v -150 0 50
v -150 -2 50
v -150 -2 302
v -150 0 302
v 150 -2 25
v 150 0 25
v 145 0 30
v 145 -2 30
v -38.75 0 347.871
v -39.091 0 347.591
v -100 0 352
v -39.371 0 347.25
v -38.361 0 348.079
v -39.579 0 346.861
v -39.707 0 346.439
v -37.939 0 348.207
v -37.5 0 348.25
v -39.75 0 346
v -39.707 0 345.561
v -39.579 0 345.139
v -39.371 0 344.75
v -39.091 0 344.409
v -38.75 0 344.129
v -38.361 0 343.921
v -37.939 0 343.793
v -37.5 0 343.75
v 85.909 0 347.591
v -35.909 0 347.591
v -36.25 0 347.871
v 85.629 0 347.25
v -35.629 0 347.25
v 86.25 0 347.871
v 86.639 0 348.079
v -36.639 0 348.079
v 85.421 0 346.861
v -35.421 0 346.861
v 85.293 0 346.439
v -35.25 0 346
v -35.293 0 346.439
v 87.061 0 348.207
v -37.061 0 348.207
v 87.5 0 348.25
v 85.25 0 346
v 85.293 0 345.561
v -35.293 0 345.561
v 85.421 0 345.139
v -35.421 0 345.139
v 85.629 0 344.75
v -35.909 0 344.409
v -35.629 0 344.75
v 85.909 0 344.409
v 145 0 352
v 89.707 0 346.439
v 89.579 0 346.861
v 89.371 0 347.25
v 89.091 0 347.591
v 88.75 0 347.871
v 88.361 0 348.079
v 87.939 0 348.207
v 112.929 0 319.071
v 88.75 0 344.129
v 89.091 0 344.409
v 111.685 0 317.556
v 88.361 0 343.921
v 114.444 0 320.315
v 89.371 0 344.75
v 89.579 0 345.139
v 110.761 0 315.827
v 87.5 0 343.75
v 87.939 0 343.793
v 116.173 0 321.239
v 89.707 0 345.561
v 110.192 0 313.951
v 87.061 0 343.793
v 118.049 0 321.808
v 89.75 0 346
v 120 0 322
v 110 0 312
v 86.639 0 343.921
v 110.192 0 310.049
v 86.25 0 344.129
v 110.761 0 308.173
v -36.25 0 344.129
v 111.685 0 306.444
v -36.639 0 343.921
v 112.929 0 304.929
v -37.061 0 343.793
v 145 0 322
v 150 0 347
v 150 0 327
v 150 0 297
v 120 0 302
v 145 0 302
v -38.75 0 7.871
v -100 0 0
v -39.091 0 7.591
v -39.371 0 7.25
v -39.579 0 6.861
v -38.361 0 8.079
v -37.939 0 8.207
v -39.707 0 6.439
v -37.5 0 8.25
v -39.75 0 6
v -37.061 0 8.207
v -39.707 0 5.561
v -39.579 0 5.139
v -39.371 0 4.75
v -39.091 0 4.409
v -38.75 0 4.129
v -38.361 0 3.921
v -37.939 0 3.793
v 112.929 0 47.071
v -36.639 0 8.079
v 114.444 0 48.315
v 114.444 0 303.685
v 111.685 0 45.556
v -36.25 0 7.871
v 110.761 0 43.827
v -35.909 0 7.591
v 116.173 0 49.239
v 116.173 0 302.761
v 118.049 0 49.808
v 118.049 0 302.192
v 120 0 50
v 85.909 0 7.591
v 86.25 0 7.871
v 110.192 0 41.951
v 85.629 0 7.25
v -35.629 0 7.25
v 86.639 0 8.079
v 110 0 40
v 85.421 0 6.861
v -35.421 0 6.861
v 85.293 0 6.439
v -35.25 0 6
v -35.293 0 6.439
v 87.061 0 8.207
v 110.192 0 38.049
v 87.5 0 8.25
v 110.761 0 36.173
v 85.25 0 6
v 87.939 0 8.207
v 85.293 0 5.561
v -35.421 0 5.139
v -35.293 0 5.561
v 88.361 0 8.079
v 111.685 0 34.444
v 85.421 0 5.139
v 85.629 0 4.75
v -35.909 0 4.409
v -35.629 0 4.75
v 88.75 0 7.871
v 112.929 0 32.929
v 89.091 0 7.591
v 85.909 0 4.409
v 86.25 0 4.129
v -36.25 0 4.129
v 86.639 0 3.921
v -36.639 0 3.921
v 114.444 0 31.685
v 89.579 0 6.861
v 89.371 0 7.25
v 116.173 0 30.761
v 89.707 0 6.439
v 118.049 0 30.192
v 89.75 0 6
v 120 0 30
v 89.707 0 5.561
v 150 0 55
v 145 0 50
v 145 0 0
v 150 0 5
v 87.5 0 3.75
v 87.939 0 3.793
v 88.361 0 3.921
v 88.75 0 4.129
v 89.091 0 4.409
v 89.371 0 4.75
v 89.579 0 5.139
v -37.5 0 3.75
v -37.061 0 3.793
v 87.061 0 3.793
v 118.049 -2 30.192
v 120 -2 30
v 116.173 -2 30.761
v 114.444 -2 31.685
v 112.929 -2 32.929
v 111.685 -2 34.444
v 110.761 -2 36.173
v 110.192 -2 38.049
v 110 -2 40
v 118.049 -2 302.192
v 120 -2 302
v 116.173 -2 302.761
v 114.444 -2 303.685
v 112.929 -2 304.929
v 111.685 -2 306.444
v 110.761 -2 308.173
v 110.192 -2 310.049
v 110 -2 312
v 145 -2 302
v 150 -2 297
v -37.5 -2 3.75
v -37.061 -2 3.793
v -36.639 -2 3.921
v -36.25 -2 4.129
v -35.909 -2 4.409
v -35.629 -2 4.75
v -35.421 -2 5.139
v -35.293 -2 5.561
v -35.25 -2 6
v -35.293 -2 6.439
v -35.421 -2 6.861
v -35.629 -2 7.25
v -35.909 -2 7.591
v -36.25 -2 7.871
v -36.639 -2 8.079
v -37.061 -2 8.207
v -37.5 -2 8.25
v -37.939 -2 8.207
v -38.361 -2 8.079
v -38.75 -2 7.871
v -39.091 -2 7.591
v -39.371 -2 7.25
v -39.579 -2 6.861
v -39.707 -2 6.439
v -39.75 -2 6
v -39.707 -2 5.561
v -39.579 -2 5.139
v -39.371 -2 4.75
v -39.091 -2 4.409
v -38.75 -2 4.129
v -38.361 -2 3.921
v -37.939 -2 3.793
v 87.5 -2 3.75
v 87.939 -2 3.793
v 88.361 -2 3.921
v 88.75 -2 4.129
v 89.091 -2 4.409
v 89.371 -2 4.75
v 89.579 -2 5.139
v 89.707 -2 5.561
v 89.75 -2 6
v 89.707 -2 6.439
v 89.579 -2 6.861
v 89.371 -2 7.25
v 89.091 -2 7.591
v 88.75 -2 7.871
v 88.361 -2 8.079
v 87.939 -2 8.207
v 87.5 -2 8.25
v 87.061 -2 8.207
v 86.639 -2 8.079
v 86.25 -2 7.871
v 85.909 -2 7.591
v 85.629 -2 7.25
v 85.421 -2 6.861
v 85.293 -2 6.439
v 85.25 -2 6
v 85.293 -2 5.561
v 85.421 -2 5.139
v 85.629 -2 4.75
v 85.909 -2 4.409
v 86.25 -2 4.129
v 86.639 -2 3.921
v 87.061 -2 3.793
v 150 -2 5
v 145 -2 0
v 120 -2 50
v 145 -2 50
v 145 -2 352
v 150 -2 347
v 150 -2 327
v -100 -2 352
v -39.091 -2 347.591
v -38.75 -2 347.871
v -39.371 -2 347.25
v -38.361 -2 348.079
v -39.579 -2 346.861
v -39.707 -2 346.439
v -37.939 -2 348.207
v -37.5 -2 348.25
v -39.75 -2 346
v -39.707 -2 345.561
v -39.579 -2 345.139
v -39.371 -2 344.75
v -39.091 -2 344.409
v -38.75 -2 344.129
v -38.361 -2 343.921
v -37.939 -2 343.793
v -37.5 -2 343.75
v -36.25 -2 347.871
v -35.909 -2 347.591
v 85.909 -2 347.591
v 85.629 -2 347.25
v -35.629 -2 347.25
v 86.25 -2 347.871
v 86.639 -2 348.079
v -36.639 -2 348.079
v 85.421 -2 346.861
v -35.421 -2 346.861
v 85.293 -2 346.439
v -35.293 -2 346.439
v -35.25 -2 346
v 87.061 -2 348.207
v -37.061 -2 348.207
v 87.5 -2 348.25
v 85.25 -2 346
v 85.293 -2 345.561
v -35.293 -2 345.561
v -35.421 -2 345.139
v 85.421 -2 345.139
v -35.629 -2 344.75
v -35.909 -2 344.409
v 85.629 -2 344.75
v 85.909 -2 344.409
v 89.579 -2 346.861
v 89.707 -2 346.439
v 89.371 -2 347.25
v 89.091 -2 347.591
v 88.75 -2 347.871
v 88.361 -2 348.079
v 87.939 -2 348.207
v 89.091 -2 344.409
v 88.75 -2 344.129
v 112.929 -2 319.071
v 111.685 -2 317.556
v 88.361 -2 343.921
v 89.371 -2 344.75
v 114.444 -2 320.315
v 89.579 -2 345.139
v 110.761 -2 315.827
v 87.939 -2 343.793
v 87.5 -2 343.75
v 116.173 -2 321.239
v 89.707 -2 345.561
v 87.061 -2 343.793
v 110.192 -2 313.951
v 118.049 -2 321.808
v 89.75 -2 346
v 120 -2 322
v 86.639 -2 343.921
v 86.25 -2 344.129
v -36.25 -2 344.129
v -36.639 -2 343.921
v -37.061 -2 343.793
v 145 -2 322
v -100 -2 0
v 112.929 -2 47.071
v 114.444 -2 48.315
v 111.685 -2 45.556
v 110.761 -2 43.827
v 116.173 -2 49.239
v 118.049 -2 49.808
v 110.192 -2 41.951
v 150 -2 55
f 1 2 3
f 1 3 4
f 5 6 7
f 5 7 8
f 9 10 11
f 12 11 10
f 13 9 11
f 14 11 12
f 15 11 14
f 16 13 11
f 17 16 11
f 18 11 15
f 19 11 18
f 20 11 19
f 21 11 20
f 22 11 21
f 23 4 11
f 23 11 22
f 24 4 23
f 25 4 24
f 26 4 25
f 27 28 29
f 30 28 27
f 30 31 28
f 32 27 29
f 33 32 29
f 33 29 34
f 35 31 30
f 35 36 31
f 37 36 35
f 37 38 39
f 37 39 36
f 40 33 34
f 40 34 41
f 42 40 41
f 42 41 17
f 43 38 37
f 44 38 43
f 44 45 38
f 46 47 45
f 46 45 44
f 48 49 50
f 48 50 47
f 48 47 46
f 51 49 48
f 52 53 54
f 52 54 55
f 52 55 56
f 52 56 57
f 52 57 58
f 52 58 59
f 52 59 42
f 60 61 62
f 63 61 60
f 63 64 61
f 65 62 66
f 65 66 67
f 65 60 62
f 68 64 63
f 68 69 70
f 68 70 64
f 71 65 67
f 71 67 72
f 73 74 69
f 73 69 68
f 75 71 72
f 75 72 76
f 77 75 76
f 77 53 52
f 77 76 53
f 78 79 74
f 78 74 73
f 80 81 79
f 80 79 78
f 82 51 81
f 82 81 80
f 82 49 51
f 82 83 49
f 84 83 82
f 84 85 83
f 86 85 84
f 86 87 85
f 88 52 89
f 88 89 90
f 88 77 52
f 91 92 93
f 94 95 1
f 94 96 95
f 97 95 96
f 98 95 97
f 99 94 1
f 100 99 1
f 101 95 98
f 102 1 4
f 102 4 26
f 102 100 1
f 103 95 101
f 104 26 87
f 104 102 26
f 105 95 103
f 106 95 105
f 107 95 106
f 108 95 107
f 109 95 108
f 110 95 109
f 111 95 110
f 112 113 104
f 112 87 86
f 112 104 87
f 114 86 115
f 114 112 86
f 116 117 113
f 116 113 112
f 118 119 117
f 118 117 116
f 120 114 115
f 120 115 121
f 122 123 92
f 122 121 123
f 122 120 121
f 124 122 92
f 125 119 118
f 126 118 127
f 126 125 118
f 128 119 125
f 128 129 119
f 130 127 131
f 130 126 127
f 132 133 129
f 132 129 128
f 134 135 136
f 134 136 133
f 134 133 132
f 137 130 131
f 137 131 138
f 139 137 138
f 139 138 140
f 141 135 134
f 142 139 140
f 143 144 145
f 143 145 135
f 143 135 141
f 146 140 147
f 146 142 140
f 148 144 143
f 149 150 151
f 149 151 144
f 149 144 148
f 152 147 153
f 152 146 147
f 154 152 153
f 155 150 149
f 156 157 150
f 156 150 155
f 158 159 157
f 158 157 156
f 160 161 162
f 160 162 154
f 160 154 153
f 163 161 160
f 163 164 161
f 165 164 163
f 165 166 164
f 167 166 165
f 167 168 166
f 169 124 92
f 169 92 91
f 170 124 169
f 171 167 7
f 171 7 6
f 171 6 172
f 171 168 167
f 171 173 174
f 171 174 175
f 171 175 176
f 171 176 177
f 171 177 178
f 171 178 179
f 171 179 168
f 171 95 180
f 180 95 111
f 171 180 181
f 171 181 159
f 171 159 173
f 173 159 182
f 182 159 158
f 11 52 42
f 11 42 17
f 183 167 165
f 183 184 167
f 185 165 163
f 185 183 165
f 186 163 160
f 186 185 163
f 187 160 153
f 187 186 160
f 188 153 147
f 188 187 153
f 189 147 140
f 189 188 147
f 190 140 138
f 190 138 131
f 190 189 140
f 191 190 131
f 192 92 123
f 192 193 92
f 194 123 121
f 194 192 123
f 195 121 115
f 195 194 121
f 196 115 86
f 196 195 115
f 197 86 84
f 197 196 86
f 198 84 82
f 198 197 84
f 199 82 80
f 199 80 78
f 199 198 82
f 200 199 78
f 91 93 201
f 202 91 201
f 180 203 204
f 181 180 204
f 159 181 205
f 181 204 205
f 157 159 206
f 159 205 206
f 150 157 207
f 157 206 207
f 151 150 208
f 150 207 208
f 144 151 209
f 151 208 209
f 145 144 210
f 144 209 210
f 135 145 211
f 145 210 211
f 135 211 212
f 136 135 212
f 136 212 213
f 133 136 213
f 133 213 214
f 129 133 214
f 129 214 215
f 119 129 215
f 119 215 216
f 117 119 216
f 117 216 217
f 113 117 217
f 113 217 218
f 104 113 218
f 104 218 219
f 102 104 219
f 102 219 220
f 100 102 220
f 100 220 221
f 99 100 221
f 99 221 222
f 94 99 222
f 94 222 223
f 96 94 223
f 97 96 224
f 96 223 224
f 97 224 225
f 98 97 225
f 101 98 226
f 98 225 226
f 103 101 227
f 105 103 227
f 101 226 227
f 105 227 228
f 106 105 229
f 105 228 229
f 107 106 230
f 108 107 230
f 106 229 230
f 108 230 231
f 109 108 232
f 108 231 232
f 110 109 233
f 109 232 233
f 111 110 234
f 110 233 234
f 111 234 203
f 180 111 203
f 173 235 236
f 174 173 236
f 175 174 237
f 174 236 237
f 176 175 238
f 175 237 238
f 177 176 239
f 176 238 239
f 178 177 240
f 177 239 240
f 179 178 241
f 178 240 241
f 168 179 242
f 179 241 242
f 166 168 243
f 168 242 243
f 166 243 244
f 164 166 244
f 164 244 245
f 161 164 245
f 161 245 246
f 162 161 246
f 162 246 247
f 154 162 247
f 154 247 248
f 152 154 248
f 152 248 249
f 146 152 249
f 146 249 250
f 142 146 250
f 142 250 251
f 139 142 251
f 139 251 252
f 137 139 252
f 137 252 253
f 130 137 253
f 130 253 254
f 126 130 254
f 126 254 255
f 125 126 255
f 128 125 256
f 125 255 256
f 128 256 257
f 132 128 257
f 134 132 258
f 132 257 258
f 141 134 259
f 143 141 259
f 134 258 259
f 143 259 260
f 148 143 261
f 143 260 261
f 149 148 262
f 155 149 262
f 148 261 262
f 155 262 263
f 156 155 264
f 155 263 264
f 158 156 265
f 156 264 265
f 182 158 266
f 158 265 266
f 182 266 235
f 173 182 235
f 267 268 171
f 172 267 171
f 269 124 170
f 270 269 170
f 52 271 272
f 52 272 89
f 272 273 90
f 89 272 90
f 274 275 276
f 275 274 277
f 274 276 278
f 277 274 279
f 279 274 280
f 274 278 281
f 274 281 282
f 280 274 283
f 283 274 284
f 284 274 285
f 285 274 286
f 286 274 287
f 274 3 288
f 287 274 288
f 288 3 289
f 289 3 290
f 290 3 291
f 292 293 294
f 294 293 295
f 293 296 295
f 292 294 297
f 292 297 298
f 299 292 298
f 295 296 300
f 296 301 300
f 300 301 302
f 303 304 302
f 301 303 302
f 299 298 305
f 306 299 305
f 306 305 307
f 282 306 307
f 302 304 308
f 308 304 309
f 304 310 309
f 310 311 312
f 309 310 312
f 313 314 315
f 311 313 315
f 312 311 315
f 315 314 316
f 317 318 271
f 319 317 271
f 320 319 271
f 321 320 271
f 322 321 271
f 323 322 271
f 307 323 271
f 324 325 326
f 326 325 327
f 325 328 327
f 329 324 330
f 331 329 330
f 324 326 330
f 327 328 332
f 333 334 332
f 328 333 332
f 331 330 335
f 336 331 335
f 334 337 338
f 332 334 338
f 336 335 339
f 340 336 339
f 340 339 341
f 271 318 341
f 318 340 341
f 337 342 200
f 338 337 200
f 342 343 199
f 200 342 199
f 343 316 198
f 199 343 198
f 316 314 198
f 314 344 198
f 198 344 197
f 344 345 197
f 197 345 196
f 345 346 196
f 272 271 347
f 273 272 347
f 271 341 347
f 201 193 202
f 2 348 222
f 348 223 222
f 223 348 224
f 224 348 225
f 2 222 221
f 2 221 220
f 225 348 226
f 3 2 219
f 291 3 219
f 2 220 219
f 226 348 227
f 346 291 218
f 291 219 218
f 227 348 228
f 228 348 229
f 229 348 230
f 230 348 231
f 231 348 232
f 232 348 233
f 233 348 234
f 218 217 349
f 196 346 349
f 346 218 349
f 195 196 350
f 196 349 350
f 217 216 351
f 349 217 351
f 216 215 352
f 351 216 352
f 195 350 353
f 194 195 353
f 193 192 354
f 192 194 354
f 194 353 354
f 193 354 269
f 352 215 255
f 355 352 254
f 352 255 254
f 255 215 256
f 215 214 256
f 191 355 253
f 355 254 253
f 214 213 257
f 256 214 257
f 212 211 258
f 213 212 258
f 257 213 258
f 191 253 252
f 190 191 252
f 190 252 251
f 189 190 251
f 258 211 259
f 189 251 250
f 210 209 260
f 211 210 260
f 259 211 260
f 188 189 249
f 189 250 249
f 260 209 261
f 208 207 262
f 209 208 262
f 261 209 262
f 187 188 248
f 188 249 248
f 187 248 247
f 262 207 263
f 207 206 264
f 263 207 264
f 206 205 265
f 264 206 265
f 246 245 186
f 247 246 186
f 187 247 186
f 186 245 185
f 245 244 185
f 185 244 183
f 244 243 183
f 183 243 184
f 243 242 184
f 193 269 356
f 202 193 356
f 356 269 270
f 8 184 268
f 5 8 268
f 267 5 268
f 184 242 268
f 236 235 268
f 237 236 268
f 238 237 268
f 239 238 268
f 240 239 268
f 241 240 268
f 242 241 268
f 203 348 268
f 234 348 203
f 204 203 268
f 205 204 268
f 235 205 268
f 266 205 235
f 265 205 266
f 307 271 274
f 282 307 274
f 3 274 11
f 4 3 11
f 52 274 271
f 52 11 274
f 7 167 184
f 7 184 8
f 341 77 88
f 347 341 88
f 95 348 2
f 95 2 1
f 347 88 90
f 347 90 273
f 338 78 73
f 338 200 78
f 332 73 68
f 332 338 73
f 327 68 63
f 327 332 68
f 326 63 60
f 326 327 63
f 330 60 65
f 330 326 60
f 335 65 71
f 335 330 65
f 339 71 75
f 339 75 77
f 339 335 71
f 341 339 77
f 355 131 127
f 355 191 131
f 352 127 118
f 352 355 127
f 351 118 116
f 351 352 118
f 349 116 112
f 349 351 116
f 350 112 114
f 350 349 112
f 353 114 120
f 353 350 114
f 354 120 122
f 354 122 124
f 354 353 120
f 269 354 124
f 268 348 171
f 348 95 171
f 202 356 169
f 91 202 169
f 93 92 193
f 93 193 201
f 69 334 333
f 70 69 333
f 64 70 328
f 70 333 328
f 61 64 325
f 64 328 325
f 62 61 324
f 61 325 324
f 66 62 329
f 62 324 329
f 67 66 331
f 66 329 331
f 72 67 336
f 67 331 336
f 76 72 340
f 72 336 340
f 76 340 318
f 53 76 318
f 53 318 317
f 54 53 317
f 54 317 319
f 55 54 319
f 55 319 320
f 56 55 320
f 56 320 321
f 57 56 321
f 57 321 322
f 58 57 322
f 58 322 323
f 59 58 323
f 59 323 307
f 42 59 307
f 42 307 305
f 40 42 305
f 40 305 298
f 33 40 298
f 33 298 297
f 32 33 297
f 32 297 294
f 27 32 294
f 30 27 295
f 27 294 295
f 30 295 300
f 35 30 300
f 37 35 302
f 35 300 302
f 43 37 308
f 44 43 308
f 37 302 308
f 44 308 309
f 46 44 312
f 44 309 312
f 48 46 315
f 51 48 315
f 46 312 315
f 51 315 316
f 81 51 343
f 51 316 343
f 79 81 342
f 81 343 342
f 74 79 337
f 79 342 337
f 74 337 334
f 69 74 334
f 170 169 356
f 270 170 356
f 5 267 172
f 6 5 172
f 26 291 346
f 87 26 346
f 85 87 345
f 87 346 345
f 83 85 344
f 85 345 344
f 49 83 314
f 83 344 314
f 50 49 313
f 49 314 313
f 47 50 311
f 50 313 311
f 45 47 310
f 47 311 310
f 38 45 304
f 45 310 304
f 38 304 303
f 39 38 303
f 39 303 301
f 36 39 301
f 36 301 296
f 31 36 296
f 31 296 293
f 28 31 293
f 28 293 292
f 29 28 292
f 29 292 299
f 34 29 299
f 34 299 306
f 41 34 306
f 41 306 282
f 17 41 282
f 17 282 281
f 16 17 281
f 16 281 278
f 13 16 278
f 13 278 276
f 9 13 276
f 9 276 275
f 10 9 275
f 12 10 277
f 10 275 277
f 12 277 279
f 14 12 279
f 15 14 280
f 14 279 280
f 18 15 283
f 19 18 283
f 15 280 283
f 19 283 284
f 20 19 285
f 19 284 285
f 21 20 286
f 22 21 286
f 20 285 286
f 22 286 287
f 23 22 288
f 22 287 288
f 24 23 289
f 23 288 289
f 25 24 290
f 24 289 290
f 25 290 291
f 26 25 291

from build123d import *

# Parameters (mm, degrees)
SKETCH1_W          = 300
SKETCH1_H          = 2
BASE_FLANGE1_DEPTH = 352
CHAMFER1_SIZE      = 5
CHAMFER2_SIZE      = 50
CUT_EXTRUDE1_REACH = 384.633
SKETCH2_R          = 2.25
SKETCH3_W          = 40
SKETCH3_H          = 20
CUT_EXTRUDE2_DEPTH = 383.632983419
FILLET1_R          = 10
CHAMFER3_SIZE      = 5


# Sheet-metal steps are written as plain solids
with BuildPart() as part:
    # Sketch1 → Base-Flange1 (new body)
    with BuildSketch(Plane.XY):
        with Locations((0, -1)):
            Rectangle(SKETCH1_W, SKETCH1_H)
    extrude(amount=BASE_FLANGE1_DEPTH)

    # Chamfer1
    chamfer1_edges = [part.edges().sort_by_distance(p)[0] for p in [
        (150, -1, 0),
        (150, -1, 352),
    ]]
    chamfer(chamfer1_edges, length=CHAMFER1_SIZE)

    # Chamfer2
    chamfer2_edges = [part.edges().sort_by_distance(p)[0] for p in [
        (-150, -1, 352),
        (-150, -1, 0),
    ]]
    chamfer(chamfer2_edges, length=CHAMFER2_SIZE)

    # Sketch2 → Cut-Extrude1 (cut, up to next)
    with BuildSketch(Plane.XZ.offset(2), mode=Mode.PRIVATE) as cut_extrude1_sk1:
        with Locations(Location((-37.5, 346, 0), (0, 0, 270))):
            Circle(SKETCH2_R)
    cut_extrude1_tool1 = extrude(cut_extrude1_sk1.sketch, amount=-CUT_EXTRUDE1_REACH, mode=Mode.PRIVATE) & part.part
    # Sketch2 → Cut-Extrude1 (cut, up to next)
    with BuildSketch(Plane.XZ.offset(2), mode=Mode.PRIVATE) as cut_extrude1_sk2:
        with Locations(Location((87.5, 346, 0), (0, 0, 270))):
            Circle(SKETCH2_R)
    cut_extrude1_tool2 = extrude(cut_extrude1_sk2.sketch, amount=-CUT_EXTRUDE1_REACH, mode=Mode.PRIVATE) & part.part
    # Sketch2 → Cut-Extrude1 (cut, up to next)
    with BuildSketch(Plane.XZ.offset(2), mode=Mode.PRIVATE) as cut_extrude1_sk3:
        with Locations(Location((87.5, 6, 0), (0, 0, 270))):
            Circle(SKETCH2_R)
    cut_extrude1_tool3 = extrude(cut_extrude1_sk3.sketch, amount=-CUT_EXTRUDE1_REACH, mode=Mode.PRIVATE) & part.part
    # Sketch2 → Cut-Extrude1 (cut, up to next)
    with BuildSketch(Plane.XZ.offset(2), mode=Mode.PRIVATE) as cut_extrude1_sk4:
        with Locations(Location((-37.5, 6, 0), (0, 0, 270))):
            Circle(SKETCH2_R)
    cut_extrude1_tool4 = extrude(cut_extrude1_sk4.sketch, amount=-CUT_EXTRUDE1_REACH, mode=Mode.PRIVATE) & part.part
    add(cut_extrude1_tool1.solids().sort_by_distance((-37.5, -2, 346))[0], mode=Mode.SUBTRACT)
    add(cut_extrude1_tool2.solids().sort_by_distance((87.5, -2, 346))[0], mode=Mode.SUBTRACT)
    add(cut_extrude1_tool3.solids().sort_by_distance((87.5, -2, 6))[0], mode=Mode.SUBTRACT)
    add(cut_extrude1_tool4.solids().sort_by_distance((-37.5, -2, 6))[0], mode=Mode.SUBTRACT)

    # Sketch3 → Cut-Extrude2 (cut, through all)
    with BuildSketch(Plane(origin=(0, 0, 0), x_dir=(1, 0, 0), z_dir=(0, 1, 0))):
        with Locations((130, -40)):
            Rectangle(SKETCH3_W, SKETCH3_H)
        with Locations((130, -312)):
            Rectangle(SKETCH3_W, SKETCH3_H)
    extrude(amount=-CUT_EXTRUDE2_DEPTH, mode=Mode.SUBTRACT)

    # Fillet1
    fillet1_edges = [part.edges().sort_by_distance(p)[0] for p in [
        (110, -1, 322),
        (110, -1, 302),
        (110, -1, 50),
        (110, -1, 30),
    ]]
    fillet(fillet1_edges, radius=FILLET1_R - 0.0001)  # a hair under: the kernel refuses the full size

    # Chamfer3
    chamfer3_edges = [part.edges().sort_by_distance(p)[0] for p in [
        (150, -1, 30),
        (150, -1, 50),
        (150, -1, 322),
        (150, -1, 302),
    ]]
    chamfer(chamfer3_edges, length=CHAMFER3_SIZE)


solid = part.part
